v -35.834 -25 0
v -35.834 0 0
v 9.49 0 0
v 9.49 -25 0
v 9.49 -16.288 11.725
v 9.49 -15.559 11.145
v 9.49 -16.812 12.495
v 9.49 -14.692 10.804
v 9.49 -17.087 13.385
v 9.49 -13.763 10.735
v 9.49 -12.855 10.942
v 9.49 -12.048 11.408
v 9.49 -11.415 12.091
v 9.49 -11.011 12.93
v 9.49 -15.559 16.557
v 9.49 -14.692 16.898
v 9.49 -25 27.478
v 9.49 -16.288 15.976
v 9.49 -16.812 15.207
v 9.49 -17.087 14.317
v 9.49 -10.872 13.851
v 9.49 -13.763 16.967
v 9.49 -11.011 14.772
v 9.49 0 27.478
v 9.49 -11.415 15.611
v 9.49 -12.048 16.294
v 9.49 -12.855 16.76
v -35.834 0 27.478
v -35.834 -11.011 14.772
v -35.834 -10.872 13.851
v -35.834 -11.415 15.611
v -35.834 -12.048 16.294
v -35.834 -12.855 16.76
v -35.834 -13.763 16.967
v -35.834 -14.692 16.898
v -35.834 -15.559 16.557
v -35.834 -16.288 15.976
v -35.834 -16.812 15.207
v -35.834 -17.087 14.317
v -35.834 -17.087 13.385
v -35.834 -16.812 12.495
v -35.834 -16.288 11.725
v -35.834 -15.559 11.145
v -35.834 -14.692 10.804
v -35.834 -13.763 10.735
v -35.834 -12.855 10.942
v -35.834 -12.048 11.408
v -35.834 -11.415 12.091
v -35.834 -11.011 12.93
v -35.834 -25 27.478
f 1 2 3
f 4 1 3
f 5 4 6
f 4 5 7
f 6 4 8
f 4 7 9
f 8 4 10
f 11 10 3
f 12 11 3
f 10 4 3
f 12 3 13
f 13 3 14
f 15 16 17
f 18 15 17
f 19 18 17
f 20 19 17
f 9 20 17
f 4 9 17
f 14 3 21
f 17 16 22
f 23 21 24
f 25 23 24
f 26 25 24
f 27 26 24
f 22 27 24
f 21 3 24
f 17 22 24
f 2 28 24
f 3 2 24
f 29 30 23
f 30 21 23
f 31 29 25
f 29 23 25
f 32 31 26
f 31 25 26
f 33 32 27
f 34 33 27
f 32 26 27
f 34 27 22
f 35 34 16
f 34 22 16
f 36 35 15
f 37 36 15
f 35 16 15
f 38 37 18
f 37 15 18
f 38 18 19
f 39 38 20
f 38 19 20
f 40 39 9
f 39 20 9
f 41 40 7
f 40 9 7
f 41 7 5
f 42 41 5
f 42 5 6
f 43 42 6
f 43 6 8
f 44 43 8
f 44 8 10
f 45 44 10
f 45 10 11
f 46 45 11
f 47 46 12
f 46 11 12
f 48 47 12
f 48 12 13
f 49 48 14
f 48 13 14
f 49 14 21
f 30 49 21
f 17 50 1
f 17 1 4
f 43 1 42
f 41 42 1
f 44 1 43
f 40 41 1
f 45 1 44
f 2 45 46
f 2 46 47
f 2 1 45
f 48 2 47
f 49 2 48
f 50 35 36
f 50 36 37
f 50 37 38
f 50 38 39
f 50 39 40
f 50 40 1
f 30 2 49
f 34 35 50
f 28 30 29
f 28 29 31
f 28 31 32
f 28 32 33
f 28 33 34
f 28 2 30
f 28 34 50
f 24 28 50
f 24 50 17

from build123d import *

# Parameters (mm, degrees)
F0_W     = 45.323744
F0_H     = 27.477518
F1_DEPTH = 25
F2_R     = 3.125
F3_DEPTH = 50


with BuildPart() as f1:
    # F0 (on Front) → F1 (new body)
    with BuildSketch(Plane.XZ):
        with Locations((-13.172213, 13.738759)):
            Rectangle(F0_W, F0_H)
    extrude(amount=F1_DEPTH)

    # F2 (on face) → F3 (cut, symmetric)
    with BuildSketch(Plane.YZ.offset(9.489659)):
        with Locations((-13.99685, 13.850922)):
            Circle(F2_R)
    extrude(amount=F3_DEPTH, both=True, mode=Mode.SUBTRACT)


solid = f1.part
